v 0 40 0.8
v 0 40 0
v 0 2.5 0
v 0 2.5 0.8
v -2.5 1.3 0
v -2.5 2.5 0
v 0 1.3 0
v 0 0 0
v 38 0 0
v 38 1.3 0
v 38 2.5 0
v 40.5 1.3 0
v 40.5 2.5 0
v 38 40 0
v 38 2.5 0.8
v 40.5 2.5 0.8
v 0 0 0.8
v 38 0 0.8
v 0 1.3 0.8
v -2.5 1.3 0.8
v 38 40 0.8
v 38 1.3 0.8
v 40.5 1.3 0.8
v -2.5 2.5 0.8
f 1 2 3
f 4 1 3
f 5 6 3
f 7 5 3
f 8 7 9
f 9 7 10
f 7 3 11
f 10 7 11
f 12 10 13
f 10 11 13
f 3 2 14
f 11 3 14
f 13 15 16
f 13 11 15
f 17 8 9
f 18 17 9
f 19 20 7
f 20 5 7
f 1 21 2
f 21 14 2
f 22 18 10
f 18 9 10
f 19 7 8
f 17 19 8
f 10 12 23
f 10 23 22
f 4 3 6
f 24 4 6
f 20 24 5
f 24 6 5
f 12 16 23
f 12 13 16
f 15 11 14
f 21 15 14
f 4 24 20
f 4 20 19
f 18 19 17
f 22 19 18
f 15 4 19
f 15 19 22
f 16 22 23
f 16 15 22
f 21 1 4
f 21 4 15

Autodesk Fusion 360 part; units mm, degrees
sketch "Sketch1" plane through (0, 0, 0) normal (0, 0, 1) x (1, 0, 0)
  line L0 (0, 0) -> (38, 0)
  line L1 (38, 40) -> (0, 40)
  line L2 (38, 2.5) -> (40.5, 2.5)
  line L3 (40.5, 2.5) -> (40.5, 1.3)
  line L4 (40.5, 1.3) -> (38, 1.3)
  line L5 (19, 40) -> (19, 0) construction
  line L6 (0, 2.5) -> (-2.5, 2.5)
  line L7 (-2.5, 2.5) -> (-2.5, 1.3)
  line L8 (-2.5, 1.3) -> (0, 1.3)
  line L9 (38, 0) -> (38, 1.3)
  line L10 (38, 2.5) -> (38, 40)
  line L11 (0, 40) -> (0, 2.5)
  line L12 (0, 1.3) -> (0, 0)
  dimension "d1" = 38
  dimension "d2" = 40
  dimension "d3" = 2.5
  dimension "d4" = 1.2
  dimension "d5" = 1.3
  dimension "d6" = 38
extrude "Extrude1" add sketch "Sketch1" along normal blind 0.8 makes body 1
copy_body "Body->Comp1" bodies 1 removing the originals makes body 2 in component "Flap "
component "Flap " placed x (1, 0, 0) y (0, 1, 0) z (0, 0, 1) at (0, 0, 0)
